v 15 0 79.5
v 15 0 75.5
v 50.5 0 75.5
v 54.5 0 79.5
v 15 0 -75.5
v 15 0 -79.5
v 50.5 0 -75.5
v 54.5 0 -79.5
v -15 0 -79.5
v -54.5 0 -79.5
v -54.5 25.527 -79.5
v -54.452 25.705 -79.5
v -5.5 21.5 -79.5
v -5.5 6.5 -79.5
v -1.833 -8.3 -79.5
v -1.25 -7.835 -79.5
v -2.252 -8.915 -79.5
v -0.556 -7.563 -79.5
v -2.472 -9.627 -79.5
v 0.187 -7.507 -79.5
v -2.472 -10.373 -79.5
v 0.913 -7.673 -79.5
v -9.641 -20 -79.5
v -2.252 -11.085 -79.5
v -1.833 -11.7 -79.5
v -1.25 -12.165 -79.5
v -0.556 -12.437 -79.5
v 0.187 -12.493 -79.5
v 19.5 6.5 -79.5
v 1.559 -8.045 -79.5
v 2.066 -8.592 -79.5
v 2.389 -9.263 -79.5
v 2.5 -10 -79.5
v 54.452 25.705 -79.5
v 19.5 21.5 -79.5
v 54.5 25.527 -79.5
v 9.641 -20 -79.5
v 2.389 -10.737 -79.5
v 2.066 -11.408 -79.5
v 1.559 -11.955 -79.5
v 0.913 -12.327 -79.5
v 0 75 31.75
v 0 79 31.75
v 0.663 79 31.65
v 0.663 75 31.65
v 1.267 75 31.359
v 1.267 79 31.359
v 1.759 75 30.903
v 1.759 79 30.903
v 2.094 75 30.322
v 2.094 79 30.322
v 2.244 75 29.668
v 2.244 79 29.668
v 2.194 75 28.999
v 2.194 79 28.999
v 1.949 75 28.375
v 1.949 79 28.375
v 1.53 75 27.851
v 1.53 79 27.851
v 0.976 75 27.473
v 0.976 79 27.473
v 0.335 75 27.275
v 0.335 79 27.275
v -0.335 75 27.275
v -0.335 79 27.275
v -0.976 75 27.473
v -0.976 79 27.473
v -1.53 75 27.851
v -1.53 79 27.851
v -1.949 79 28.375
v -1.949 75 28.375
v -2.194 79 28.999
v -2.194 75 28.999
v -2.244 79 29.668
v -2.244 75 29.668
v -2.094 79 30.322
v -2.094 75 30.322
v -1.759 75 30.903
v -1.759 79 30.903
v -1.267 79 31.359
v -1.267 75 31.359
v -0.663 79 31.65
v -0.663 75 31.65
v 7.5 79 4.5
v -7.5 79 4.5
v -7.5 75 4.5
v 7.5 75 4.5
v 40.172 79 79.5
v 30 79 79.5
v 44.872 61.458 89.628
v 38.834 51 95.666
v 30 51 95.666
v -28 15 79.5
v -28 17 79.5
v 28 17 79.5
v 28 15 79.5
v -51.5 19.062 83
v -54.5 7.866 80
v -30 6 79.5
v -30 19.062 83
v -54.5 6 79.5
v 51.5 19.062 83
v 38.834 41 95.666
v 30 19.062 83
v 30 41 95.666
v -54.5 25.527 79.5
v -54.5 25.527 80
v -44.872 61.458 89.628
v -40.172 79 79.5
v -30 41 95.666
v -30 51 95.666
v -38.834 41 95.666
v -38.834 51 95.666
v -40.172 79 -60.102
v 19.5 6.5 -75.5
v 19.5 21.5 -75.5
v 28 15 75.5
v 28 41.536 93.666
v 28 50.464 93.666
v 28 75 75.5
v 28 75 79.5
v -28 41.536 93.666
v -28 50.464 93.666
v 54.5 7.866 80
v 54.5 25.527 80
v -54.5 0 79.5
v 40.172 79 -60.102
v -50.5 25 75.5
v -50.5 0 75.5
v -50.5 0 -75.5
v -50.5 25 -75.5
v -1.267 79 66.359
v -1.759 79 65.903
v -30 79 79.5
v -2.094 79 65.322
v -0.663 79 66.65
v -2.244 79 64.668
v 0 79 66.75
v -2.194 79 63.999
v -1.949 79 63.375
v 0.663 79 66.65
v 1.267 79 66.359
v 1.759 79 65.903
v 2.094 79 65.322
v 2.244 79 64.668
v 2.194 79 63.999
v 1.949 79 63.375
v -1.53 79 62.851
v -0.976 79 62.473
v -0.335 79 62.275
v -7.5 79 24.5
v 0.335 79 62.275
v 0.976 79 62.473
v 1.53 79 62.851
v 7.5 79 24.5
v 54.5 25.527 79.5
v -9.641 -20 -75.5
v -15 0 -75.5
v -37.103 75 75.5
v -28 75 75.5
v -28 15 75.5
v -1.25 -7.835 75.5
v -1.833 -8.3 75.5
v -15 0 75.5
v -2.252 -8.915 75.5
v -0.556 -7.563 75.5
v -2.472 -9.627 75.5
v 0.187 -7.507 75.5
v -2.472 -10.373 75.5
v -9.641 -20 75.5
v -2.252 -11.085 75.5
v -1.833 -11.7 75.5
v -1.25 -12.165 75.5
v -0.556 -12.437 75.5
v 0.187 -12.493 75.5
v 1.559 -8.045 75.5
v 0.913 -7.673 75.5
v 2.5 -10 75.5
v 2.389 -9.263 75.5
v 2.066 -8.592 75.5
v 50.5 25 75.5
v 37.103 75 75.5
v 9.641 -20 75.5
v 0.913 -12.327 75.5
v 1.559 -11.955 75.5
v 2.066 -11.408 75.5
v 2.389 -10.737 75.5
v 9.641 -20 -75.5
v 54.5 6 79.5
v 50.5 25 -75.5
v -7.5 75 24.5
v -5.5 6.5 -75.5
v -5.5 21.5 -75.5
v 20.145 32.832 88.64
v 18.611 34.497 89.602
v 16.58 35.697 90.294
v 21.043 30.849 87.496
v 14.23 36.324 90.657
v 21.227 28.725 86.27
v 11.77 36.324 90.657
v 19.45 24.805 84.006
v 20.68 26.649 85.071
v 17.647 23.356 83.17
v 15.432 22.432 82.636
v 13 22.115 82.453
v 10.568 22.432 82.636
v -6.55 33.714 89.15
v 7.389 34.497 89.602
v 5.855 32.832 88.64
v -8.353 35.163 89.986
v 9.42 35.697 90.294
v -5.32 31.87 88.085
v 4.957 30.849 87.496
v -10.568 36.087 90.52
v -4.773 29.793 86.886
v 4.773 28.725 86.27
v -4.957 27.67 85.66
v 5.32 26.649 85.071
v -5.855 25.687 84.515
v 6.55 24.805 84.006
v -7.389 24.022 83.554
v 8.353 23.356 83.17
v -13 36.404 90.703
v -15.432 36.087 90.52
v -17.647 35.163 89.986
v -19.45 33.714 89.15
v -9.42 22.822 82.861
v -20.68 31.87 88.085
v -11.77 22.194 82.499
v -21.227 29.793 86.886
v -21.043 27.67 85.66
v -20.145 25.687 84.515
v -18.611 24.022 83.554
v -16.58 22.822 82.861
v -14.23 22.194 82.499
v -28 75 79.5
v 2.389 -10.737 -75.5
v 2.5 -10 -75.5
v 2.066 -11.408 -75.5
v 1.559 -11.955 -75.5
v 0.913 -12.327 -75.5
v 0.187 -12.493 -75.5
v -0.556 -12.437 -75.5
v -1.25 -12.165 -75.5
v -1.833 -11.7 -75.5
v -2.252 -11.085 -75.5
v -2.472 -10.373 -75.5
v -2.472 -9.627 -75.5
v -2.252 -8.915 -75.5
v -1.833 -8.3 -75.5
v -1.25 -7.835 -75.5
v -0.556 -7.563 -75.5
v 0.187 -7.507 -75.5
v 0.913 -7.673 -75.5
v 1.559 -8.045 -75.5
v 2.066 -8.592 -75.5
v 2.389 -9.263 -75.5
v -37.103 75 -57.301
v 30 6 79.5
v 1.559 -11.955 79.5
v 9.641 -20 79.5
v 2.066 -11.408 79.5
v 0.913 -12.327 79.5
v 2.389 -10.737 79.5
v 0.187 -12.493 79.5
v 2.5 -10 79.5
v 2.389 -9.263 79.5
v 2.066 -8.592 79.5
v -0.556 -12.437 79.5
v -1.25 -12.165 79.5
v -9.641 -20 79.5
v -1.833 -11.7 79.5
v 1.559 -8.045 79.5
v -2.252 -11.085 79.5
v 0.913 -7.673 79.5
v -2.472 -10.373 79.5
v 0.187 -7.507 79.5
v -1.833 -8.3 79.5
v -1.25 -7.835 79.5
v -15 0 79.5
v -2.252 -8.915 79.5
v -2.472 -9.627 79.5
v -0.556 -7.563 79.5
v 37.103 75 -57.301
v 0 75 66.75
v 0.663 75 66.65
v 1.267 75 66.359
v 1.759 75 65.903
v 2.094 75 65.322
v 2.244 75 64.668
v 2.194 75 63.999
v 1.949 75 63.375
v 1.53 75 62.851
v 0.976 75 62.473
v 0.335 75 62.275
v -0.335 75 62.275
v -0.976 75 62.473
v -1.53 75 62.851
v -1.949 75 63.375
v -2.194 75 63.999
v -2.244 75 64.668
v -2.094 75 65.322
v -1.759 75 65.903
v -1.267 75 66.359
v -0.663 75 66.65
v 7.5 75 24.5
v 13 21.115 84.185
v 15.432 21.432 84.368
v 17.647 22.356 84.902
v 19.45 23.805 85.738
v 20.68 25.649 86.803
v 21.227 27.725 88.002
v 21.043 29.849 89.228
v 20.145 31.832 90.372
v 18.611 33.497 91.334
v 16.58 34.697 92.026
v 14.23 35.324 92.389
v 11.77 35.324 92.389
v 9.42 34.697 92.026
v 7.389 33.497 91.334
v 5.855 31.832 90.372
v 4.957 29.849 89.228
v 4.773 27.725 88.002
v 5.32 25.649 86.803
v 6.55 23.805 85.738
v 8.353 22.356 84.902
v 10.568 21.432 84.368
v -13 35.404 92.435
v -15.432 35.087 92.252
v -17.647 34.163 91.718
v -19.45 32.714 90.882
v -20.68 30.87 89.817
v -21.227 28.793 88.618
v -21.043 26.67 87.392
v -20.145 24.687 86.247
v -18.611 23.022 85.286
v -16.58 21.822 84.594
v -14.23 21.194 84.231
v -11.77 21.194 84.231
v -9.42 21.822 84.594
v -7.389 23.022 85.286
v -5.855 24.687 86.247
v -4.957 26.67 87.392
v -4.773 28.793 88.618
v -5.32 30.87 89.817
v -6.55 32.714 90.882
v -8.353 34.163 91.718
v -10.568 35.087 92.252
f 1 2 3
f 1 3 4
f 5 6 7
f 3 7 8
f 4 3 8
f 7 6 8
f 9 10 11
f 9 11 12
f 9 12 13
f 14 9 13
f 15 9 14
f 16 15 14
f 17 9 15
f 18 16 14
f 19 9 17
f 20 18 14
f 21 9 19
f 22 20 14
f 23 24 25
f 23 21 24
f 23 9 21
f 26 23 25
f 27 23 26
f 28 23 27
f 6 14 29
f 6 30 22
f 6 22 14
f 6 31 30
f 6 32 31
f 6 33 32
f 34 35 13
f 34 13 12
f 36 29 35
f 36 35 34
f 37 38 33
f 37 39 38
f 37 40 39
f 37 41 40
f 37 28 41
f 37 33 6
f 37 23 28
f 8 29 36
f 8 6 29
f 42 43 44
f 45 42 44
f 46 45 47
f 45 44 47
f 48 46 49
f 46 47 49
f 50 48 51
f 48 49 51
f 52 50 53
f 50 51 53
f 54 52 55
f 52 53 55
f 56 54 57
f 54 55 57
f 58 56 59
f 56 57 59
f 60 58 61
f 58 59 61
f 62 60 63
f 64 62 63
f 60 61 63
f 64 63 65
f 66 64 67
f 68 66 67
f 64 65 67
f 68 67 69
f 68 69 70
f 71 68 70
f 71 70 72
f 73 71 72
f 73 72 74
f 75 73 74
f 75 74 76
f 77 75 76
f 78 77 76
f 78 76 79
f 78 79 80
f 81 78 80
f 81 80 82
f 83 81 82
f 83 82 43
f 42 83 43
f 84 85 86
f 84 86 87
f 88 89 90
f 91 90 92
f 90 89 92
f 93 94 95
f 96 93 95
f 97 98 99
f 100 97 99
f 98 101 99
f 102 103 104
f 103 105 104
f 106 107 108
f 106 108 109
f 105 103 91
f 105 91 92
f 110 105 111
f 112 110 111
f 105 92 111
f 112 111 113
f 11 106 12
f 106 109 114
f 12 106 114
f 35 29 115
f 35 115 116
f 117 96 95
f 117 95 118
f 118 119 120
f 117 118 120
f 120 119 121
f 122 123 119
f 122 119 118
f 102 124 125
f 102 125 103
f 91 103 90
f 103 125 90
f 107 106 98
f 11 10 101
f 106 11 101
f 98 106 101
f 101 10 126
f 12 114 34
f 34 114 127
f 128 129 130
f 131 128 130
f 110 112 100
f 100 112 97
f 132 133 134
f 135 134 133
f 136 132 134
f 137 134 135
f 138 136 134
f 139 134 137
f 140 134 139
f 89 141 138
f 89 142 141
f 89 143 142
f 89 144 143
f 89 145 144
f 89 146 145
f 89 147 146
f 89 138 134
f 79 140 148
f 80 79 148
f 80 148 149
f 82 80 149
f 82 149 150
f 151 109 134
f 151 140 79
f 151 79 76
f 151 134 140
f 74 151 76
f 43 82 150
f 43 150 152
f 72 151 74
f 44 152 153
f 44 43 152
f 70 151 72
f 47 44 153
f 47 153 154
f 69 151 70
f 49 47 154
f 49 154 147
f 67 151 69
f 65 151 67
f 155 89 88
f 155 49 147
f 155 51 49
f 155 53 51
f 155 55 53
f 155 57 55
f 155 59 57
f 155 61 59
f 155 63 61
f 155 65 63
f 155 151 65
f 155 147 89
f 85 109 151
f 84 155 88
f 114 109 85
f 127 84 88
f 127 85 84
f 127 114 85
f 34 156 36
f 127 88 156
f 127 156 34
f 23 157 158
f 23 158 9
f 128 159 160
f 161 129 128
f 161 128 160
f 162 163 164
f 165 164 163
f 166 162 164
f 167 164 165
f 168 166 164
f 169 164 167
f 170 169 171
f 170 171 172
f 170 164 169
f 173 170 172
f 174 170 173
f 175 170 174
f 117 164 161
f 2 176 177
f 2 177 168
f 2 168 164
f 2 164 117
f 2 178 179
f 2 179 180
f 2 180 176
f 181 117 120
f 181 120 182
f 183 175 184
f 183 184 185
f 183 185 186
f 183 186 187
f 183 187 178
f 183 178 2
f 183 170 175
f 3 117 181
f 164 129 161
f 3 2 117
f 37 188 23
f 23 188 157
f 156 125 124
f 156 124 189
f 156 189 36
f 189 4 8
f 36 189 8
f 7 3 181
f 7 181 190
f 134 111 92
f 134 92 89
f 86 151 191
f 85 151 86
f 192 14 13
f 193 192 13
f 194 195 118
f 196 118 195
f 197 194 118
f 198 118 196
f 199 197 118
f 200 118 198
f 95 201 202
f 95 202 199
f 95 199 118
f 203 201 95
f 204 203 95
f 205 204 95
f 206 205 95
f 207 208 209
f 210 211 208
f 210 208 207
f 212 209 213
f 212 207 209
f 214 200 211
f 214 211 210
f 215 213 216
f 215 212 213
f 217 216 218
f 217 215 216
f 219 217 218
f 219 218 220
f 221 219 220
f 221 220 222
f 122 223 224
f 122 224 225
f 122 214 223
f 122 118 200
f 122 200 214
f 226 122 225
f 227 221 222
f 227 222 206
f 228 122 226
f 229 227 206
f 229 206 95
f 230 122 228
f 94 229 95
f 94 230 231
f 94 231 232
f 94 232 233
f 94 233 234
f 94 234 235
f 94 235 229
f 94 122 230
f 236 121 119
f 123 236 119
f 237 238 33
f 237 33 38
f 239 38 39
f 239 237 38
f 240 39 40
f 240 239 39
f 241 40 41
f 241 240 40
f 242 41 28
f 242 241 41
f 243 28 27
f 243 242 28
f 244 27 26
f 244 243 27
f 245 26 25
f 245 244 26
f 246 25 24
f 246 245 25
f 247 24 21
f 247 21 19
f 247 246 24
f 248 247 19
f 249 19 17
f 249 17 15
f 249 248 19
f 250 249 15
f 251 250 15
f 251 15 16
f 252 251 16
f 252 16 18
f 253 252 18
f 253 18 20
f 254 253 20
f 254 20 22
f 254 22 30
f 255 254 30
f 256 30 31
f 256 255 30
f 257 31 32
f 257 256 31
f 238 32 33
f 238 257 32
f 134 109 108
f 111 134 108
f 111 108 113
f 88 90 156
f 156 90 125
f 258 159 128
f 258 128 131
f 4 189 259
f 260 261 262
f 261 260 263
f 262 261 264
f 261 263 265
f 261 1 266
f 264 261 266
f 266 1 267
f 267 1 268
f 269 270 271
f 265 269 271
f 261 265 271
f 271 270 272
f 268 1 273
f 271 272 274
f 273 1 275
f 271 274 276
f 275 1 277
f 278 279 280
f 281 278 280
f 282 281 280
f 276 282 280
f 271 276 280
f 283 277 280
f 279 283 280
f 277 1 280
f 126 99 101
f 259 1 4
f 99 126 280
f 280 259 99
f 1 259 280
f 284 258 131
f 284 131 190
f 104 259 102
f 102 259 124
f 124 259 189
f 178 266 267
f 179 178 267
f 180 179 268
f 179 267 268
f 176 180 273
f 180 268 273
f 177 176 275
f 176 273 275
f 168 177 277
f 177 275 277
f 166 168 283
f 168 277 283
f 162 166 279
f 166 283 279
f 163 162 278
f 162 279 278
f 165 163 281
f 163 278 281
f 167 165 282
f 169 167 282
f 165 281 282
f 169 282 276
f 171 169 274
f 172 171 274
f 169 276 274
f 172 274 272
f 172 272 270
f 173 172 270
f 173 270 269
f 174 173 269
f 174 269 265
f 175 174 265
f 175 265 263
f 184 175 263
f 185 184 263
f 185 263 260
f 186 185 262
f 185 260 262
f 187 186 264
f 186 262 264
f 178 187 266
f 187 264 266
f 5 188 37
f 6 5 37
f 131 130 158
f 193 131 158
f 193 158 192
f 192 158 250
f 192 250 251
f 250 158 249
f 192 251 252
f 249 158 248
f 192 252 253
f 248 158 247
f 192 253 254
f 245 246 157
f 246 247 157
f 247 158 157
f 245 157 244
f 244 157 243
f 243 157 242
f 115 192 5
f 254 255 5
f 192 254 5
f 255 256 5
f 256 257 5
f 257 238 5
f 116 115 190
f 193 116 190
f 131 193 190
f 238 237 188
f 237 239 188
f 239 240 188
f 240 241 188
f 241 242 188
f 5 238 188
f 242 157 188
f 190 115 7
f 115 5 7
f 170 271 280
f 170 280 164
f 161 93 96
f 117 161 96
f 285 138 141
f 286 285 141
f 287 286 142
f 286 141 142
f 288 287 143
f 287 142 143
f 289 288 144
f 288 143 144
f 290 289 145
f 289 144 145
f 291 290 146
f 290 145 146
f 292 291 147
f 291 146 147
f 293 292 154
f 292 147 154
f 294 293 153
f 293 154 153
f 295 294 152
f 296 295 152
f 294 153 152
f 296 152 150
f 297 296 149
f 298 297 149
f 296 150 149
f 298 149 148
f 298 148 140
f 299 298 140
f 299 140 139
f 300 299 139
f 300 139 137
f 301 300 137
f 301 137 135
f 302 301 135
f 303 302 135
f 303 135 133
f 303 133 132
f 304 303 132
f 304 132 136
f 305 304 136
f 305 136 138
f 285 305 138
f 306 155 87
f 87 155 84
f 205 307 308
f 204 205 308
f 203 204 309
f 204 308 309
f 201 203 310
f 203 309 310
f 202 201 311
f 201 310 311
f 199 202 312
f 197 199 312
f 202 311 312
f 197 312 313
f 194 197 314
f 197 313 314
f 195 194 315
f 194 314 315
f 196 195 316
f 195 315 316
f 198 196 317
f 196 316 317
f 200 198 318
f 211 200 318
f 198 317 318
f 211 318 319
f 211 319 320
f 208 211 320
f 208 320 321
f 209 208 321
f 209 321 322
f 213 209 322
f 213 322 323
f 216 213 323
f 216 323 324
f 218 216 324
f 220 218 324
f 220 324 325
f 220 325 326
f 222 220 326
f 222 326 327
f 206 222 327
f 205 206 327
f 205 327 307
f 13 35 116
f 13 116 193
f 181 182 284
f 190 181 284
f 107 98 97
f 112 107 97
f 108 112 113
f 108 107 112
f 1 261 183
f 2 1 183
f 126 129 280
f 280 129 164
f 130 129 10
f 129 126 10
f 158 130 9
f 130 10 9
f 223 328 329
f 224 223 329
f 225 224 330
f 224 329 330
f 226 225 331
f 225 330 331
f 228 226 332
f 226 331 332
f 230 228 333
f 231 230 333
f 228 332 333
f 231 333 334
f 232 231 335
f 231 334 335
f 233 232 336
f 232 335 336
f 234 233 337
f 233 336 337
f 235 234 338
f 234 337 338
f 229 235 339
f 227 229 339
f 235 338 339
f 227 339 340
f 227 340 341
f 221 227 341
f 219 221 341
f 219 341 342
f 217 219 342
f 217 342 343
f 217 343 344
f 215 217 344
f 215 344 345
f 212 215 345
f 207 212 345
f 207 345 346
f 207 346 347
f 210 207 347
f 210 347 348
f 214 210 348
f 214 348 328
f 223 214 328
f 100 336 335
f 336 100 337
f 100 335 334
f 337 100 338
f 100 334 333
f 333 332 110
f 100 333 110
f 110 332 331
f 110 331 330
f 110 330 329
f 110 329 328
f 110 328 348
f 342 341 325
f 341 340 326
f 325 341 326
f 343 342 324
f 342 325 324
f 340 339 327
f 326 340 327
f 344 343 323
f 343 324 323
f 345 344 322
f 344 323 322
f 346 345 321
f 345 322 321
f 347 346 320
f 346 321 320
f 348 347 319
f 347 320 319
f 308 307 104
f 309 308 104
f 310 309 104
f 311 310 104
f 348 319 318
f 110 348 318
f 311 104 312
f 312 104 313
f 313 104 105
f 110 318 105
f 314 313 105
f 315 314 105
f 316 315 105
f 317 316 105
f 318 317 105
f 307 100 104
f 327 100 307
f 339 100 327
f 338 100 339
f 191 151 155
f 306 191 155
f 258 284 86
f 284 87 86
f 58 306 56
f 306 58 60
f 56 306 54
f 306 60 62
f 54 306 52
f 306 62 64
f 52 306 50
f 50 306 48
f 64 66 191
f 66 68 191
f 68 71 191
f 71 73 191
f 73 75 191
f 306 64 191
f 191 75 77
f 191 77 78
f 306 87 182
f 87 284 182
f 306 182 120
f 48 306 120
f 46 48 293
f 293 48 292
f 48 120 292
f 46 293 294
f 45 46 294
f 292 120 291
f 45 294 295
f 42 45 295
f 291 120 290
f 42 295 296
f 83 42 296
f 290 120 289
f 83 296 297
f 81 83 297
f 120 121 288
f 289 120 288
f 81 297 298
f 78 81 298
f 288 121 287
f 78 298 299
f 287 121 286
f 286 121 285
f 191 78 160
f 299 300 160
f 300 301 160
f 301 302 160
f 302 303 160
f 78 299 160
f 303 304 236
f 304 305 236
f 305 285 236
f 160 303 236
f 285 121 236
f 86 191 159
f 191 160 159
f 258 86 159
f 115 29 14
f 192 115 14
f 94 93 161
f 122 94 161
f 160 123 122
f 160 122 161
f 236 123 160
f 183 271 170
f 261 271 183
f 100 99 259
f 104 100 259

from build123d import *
from OCP.BRepFilletAPI import BRepFilletAPI_MakeChamfer

# Parameters (mm, degrees)
SKETCH1_W                                    = 101
SKETCH1_H                                    = 151
BOX_DEPTH                                    = 75
CHAMFER_SIDES_SIZE                           = 50
CHAMFER_SIDES_SIZE2                          = 13.397459622
CHAMFER_BACK_SIZE                            = 50
CHAMFER_BACK_SIZE2                           = 18.198511713
SHELL1_T                                     = 4
SKETCH2_W                                    = 30
SKETCH2_H                                    = 20
SKETCH2_R                                    = 2.5
FRONT_MOUNT_TAB_DEPTH                        = 4
BACK_START                                   = -4
SKETCH3_W                                    = 30
SKETCH3_H                                    = 20
SKETCH3_R                                    = 2.5
BACK_MOUNT_TAB_DEPTH                         = 4
CHAMFER_MOUNT_TAB_SIZE                       = 20
CHAMFER_MOUNT_TAB_SIZE_2                     = 5.358983849
HEAD_ASSEMBLY_MOUNT_AND_CABLE_PASSTHRU_REACH = 140.172
SKETCH4_R                                    = 2.25
SKETCH4_W                                    = 15
SKETCH4_H                                    = 20
STAIR_DETECTION_MOUNT_DEPTH                  = 30
SHELL_START                                  = -28
SHELL_MOUNT_DEPTH                            = 56
SKETCH7_W                                    = 56
SKETCH7_H                                    = 62
OPEN_SHELL_TO_SHELL_DEPTH                    = 4
FILL_GAP_REACH                               = 187.721
SKETCH9_W                                    = 56
SKETCH9_H                                    = 2
STAIR_DETECTION_EYE_HOLES_REACH              = 183.466
SKETCH8_R                                    = 8.25
CHAMFER_FRONT_1_SIZE                         = 25
CHAMFER_FRONT_2_SIZE                         = 7
POWER_SWITCH_AND_USB_ACCESS_REACH            = 201.736
SKETCH10_W                                   = 25
SKETCH10_H                                   = 15


# Read off the part's stored shape, not the designer's step: shell mount
# Some blends are built 0.0001 mm under size
with BuildPart() as part:
    # Sketch1 → box (new body)
    with BuildSketch(Plane(origin=(0, 0, 0), x_dir=(1, 0, 0), z_dir=(0, 1, 0))):
        Rectangle(SKETCH1_W, SKETCH1_H)
    extrude(amount=BOX_DEPTH)

    # Chamfer sides: one chamfer whose edges measure the first distance from different faces: ONE call of the kernel's chamfer builder (chamfer() names one face for all edges)
    chamfer_sides_edges_1 = [part.edges().sort_by_distance(p)[0] for p in [
        (-50.5, 75, 0),
    ]]
    chamfer_sides_side_1 = [part.faces().sort_by_distance(p)[0] for p in [
        (-50.5, 37.5, 0),
    ]]
    chamfer_sides_edges_2 = [part.edges().sort_by_distance(p)[0] for p in [
        (50.5, 75, 0),
    ]]
    chamfer_sides_side_2 = [part.faces().sort_by_distance(p)[0] for p in [
        (50.5, 37.5, 0),
    ]]
    chamfer_sides = BRepFilletAPI_MakeChamfer(part.part.solid().wrapped)
    for e in chamfer_sides_edges_1:
        chamfer_sides.Add(CHAMFER_SIDES_SIZE, CHAMFER_SIDES_SIZE2, e.wrapped, chamfer_sides_side_1[0].wrapped)  # the first distance lies on this face
    for e in chamfer_sides_edges_2:
        chamfer_sides.Add(CHAMFER_SIDES_SIZE, CHAMFER_SIDES_SIZE2, e.wrapped, chamfer_sides_side_2[0].wrapped)  # the first distance lies on this face
    add(Compound.cast(chamfer_sides.Shape()), mode=Mode.REPLACE)

    # Chamfer back
    chamfer_back_edges = [part.edges().sort_by_distance(p)[0] for p in [
        (0, 75, -75.5),
    ]]
    chamfer_back_side = [part.faces().sort_by_distance(p)[0] for p in [
        (0, 35.478938394, -75.5),
    ]]
    chamfer(chamfer_back_edges, length=CHAMFER_BACK_SIZE, length2=CHAMFER_BACK_SIZE2, reference=chamfer_back_side[0])

    # Shell1
    shell1_openings = [part.faces().sort_by_distance(p)[0] for p in [
        (0, 0, 0),
    ]]
    offset(amount=SHELL1_T, openings=shell1_openings, kind=Kind.INTERSECTION)

    # Sketch2 → front mount tab (add)
    with BuildSketch(Plane.XY.offset(79.5)):
        with Locations((0, -10)):
            Rectangle(SKETCH2_W, SKETCH2_H)
        with Locations((0, -10)):
            Circle(SKETCH2_R, mode=Mode.SUBTRACT)
    extrude(amount=-FRONT_MOUNT_TAB_DEPTH)

    # Sketch3 → back mount tab (add)
    with BuildSketch(Plane(origin=(0, 0, -79.5), x_dir=(-1, 0, 0), z_dir=(0, 0, -1)).offset(BACK_START)):
        with Locations((0, -10)):
            Rectangle(SKETCH3_W, SKETCH3_H)
        with Locations(Location((0, -10, 0), (0, 0, 180))):
            Circle(SKETCH3_R, mode=Mode.SUBTRACT)
    extrude(amount=BACK_MOUNT_TAB_DEPTH)

    # Chamfer mount tab
    chamfer_mount_tab_edges_1 = [part.edges().sort_by_distance(p)[0] for p in [
        (-15, -20, 77.5),
    ]]
    chamfer_mount_tab_side_1 = [part.faces().sort_by_distance(p)[0] for p in [
        (-15, -19.892820323, 77.5),
    ]]
    chamfer_mount_tab_edges_2 = [part.edges().sort_by_distance(p)[0] for p in [
        (15, -20, 77.5),
    ]]
    chamfer_mount_tab_side_2 = [part.faces().sort_by_distance(p)[0] for p in [
        (15, -19.892820323, 77.5),
    ]]
    chamfer_mount_tab_edges_3 = [part.edges().sort_by_distance(p)[0] for p in [
        (-15, -20, -77.5),
    ]]
    chamfer_mount_tab_side_3 = [part.faces().sort_by_distance(p)[0] for p in [
        (-15, -19.892820323, -77.5),
    ]]
    chamfer_mount_tab_edges_4 = [part.edges().sort_by_distance(p)[0] for p in [
        (15, -20, -77.5),
    ]]
    chamfer_mount_tab_side_4 = [part.faces().sort_by_distance(p)[0] for p in [
        (14.892820323, -20, -77.5),
    ]]
    chamfer_mount_tab = BRepFilletAPI_MakeChamfer(part.part.solid().wrapped)
    for e in chamfer_mount_tab_edges_1:
        chamfer_mount_tab.Add(CHAMFER_MOUNT_TAB_SIZE - 0.0001, CHAMFER_MOUNT_TAB_SIZE_2 - 0.0001, e.wrapped, chamfer_mount_tab_side_1[0].wrapped)
    for e in chamfer_mount_tab_edges_2:
        chamfer_mount_tab.Add(CHAMFER_MOUNT_TAB_SIZE - 0.0001, CHAMFER_MOUNT_TAB_SIZE_2 - 0.0001, e.wrapped, chamfer_mount_tab_side_2[0].wrapped)
    for e in chamfer_mount_tab_edges_3:
        chamfer_mount_tab.Add(CHAMFER_MOUNT_TAB_SIZE - 0.0001, CHAMFER_MOUNT_TAB_SIZE_2 - 0.0001, e.wrapped, chamfer_mount_tab_side_3[0].wrapped)
    for e in chamfer_mount_tab_edges_4:
        chamfer_mount_tab.Add(CHAMFER_MOUNT_TAB_SIZE_2 - 0.0001, CHAMFER_MOUNT_TAB_SIZE - 0.0001, e.wrapped, chamfer_mount_tab_side_4[0].wrapped)
    add(Compound.cast(chamfer_mount_tab.Shape()), mode=Mode.REPLACE)  # a hair under: the kernel refuses the full size

    # Sketch4 → head assembly mount and cable passthru (cut, up to next)
    with BuildSketch(Plane(origin=(0, 79, 0), x_dir=(1, 0, 0), z_dir=(0, 1, 0)), mode=Mode.PRIVATE) as head_assembly_mount_and_cable_passthru_sk1:
        with Locations(Location((0, -64.5, 0), (0, 0, 270))):
            Circle(SKETCH4_R)
    head_assembly_mount_and_cable_passthru_tool1 = extrude(head_assembly_mount_and_cable_passthru_sk1.sketch, amount=-HEAD_ASSEMBLY_MOUNT_AND_CABLE_PASSTHRU_REACH, mode=Mode.PRIVATE) & part.part
    # Sketch4 → head assembly mount and cable passthru (cut, up to next)
    with BuildSketch(Plane(origin=(0, 79, 0), x_dir=(1, 0, 0), z_dir=(0, 1, 0)), mode=Mode.PRIVATE) as head_assembly_mount_and_cable_passthru_sk2:
        with Locations(Location((0, -29.5, 0), (0, 0, 270))):
            Circle(SKETCH4_R)
    head_assembly_mount_and_cable_passthru_tool2 = extrude(head_assembly_mount_and_cable_passthru_sk2.sketch, amount=-HEAD_ASSEMBLY_MOUNT_AND_CABLE_PASSTHRU_REACH, mode=Mode.PRIVATE) & part.part
    # Sketch4 → head assembly mount and cable passthru (cut, up to next)
    with BuildSketch(Plane(origin=(0, 79, 0), x_dir=(1, 0, 0), z_dir=(0, 1, 0)), mode=Mode.PRIVATE) as head_assembly_mount_and_cable_passthru_sk3:
        with Locations((0, -14.5)):
            Rectangle(SKETCH4_W, SKETCH4_H)
    head_assembly_mount_and_cable_passthru_tool3 = extrude(head_assembly_mount_and_cable_passthru_sk3.sketch, amount=-HEAD_ASSEMBLY_MOUNT_AND_CABLE_PASSTHRU_REACH, mode=Mode.PRIVATE) & part.part
    add(head_assembly_mount_and_cable_passthru_tool1.solids().sort_by_distance((0, 79, 64.5))[0], mode=Mode.SUBTRACT)
    add(head_assembly_mount_and_cable_passthru_tool2.solids().sort_by_distance((0, 79, 29.5))[0], mode=Mode.SUBTRACT)
    add(head_assembly_mount_and_cable_passthru_tool3.solids().sort_by_distance((0, 79, 14.5))[0], mode=Mode.SUBTRACT)


with BuildPart() as body_2:
    # Sketch5 → stair detection mount (new, symmetric)
    with BuildSketch(Plane(origin=(0, 0, 0), x_dir=(0, 0, -1), z_dir=(1, 0, 0))):
        Polygon((-79.5, 13), (-95.665807537, 41), (-95.665807537, 51), (-79.5, 79), (-75.5, 79), (-75.5, 75), (-75.5, 25), (-75.5, 13), align=None)
    extrude(amount=STAIR_DETECTION_MOUNT_DEPTH, both=True)

    # shell mount outline → shell mount (cut)
    with BuildSketch(Plane.YZ.offset(SHELL_START)):
        Polygon((77, 75.5), (77, 78.345299462), (50.464101615, 93.665807537), (41.535898385, 93.665807537), (15, 78.345299462), (15, 75.5), align=None)
    extrude(amount=SHELL_MOUNT_DEPTH, mode=Mode.SUBTRACT)


with BuildPart() as open_shell_to_shell_tool:
    # Sketch7 → open shell to shell (new body)
    with BuildSketch(Plane.XY.offset(79.5)):
        with Locations((0, 46)):
            Rectangle(SKETCH7_W, SKETCH7_H)
    extrude(amount=-OPEN_SHELL_TO_SHELL_DEPTH)


with BuildPart() as part_1:
    add(part.part)

    # open shell to shell: cut by open_shell_to_shell_tool
    add(open_shell_to_shell_tool.part, mode=Mode.SUBTRACT)

    # Sketch9 → fill gap (add, up to next)
    with BuildSketch(Plane(origin=(0, 0, 79.5), x_dir=(-1, 0, 0), z_dir=(0, 0, -1)), mode=Mode.PRIVATE) as fill_gap_sk1:
        with Locations((0, 76)):
            Rectangle(SKETCH9_W, SKETCH9_H)
    fill_gap_tool1 = extrude(fill_gap_sk1.sketch, amount=FILL_GAP_REACH, mode=Mode.PRIVATE) - part_1.part
    add(fill_gap_tool1.solids().sort_by_distance((0, 76, 79.5))[0])


with BuildPart() as body_2_1:
    add(body_2.part)

    # open shell to shell: cut by open_shell_to_shell_tool
    add(open_shell_to_shell_tool.part, mode=Mode.SUBTRACT)


with BuildPart() as part_2:
    add(part_1.part)

    # Combine two shells: union body 2
    add(body_2_1.part)

    # Sketch8 → stair detection eye holes (cut, up to next)
    with BuildSketch(Plane(origin=(0, -31.1745098, 53.995834875), x_dir=(1, 0, 0), z_dir=(0, -0.4999999999999956, 0.8660254037844412)), mode=Mode.PRIVATE) as stair_detection_eye_holes_sk1:
        with Locations(Location((13, 68.628330249, 0), (0, 0, 270))):
            Circle(SKETCH8_R)
    stair_detection_eye_holes_tool1 = extrude(stair_detection_eye_holes_sk1.sketch, amount=-STAIR_DETECTION_EYE_HOLES_REACH, mode=Mode.PRIVATE) & part_2.part
    # Sketch8 → stair detection eye holes (cut, up to next)
    with BuildSketch(Plane(origin=(0, -31.1745098, 53.995834875), x_dir=(1, 0, 0), z_dir=(0, -0.4999999999999956, 0.8660254037844412)), mode=Mode.PRIVATE) as stair_detection_eye_holes_sk2:
        with Locations(Location((-13, 68.628330249, 0), (0, 0, 90))):
            Circle(SKETCH8_R)
    stair_detection_eye_holes_tool2 = extrude(stair_detection_eye_holes_sk2.sketch, amount=-STAIR_DETECTION_EYE_HOLES_REACH, mode=Mode.PRIVATE) & part_2.part
    add(stair_detection_eye_holes_tool1.solids().sort_by_distance((13, 28.259368, 88.31))[0], mode=Mode.SUBTRACT)
    add(stair_detection_eye_holes_tool2.solids().sort_by_distance((-13, 28.259368, 88.31))[0], mode=Mode.SUBTRACT)

    # Chamfer front 1
    # the kernel refuses this chamfer: 25 mm, written as the material it adds along each edge
    with BuildSketch(Plane(origin=(-30, 79, 79.5), x_dir=(-0.9996219169112966, 0, -0.027495876610586594), z_dir=(0, -1, 0))) as chamfer_front_1_piece_1_section:
        Polygon((CHAMFER_FRONT_1_SIZE * 0.999621916911, -CHAMFER_FRONT_1_SIZE * 0.0274958766106), (-CHAMFER_FRONT_1_SIZE * 0.0274958766106, -CHAMFER_FRONT_1_SIZE * 0.999621916911), (0, 0), align=None)
    chamfer_front_1_piece_1 = extrude(amount=130.292074699, mode=Mode.PRIVATE)
    chamfer_front_1_piece_1 = split(chamfer_front_1_piece_1, bisect_by=Plane(origin=(-54.5, 43.759151697, 84.684492494), z_dir=(1, 0, 0)), keep=Keep.TOP, mode=Mode.PRIVATE)
    chamfer_front_1_piece_1 = split(chamfer_front_1_piece_1, bisect_by=Plane(origin=(-48.880491022, 46.498903009, 84.684492494), z_dir=(0.9659258262890682, -0.25881904510252135, 0)), keep=Keep.TOP, mode=Mode.PRIVATE)
    chamfer_front_1_piece_1 = split(chamfer_front_1_piece_1, bisect_by=Plane(origin=(-38.655599925, 38.314314876, 94.115226508), z_dir=(0, 0.4999999999999953, -0.8660254037844416)), keep=Keep.TOP, mode=Mode.PRIVATE)
    chamfer_front_1_piece_1 = split(chamfer_front_1_piece_1, bisect_by=Plane(origin=(-38.655599925, 50.32441267, 96.055858064), z_dir=(0, -0.4999999999999949, -0.8660254037844416)), keep=Keep.TOP, mode=Mode.PRIVATE)
    chamfer_front_1_piece_1 = split(chamfer_front_1_piece_1, bisect_by=Plane(origin=(-38.655599925, 43.759151697, 95.665807537), z_dir=(0, 0, -1)), keep=Keep.TOP, mode=Mode.PRIVATE)
    add(chamfer_front_1_piece_1)
    with BuildSketch(Plane(origin=(30, 79, 79.5), x_dir=(0.9996219169112966, 0, -0.027495876610586594), z_dir=(0, -1, 0))) as chamfer_front_1_piece_2_section:
        Polygon((CHAMFER_FRONT_1_SIZE * 0.999621916911, CHAMFER_FRONT_1_SIZE * 0.0274958766106), (-CHAMFER_FRONT_1_SIZE * 0.0274958766106, CHAMFER_FRONT_1_SIZE * 0.999621916911), (0, 0), align=None)
    chamfer_front_1_piece_2 = extrude(amount=130.292074699, mode=Mode.PRIVATE)
    chamfer_front_1_piece_2 = split(chamfer_front_1_piece_2, bisect_by=Plane(origin=(38.655599925, 38.314314876, 94.115226508), z_dir=(0, 0.4999999999999953, -0.8660254037844416)), keep=Keep.TOP, mode=Mode.PRIVATE)
    chamfer_front_1_piece_2 = split(chamfer_front_1_piece_2, bisect_by=Plane(origin=(48.880491022, 46.498903009, 84.684492494), z_dir=(-0.9659258262890682, -0.25881904510252135, 0)), keep=Keep.TOP, mode=Mode.PRIVATE)
    chamfer_front_1_piece_2 = split(chamfer_front_1_piece_2, bisect_by=Plane(origin=(54.5, 43.759151697, 84.684492494), z_dir=(-1, 0, 0)), keep=Keep.TOP, mode=Mode.PRIVATE)
    chamfer_front_1_piece_2 = split(chamfer_front_1_piece_2, bisect_by=Plane(origin=(38.655599925, 50.32441267, 96.055858064), z_dir=(0, -0.4999999999999949, -0.8660254037844416)), keep=Keep.TOP, mode=Mode.PRIVATE)
    chamfer_front_1_piece_2 = split(chamfer_front_1_piece_2, bisect_by=Plane(origin=(38.655599925, 43.759151697, 95.665807537), z_dir=(0, 0, -1)), keep=Keep.TOP, mode=Mode.PRIVATE)
    add(chamfer_front_1_piece_2)

    # Chamfer front 2
    chamfer_front_2_edges = [part_2.edges().sort_by_distance(p)[0] for p in [
        (0, 13, 79.5),
    ]]
    chamfer(chamfer_front_2_edges, length=CHAMFER_FRONT_2_SIZE)

    # Sketch10 → power switch and USB access (cut, up to next)
    with BuildSketch(Plane(origin=(0, 0, -79.5), x_dir=(-1, 0, 0), z_dir=(0, 0, -1)), mode=Mode.PRIVATE) as power_switch_and_usb_access_sk1:
        with Locations((-7, 14)):
            Rectangle(SKETCH10_W, SKETCH10_H)
    power_switch_and_usb_access_tool1 = extrude(power_switch_and_usb_access_sk1.sketch, amount=-POWER_SWITCH_AND_USB_ACCESS_REACH, mode=Mode.PRIVATE) & part_2.part
    add(power_switch_and_usb_access_tool1.solids().sort_by_distance((7, 14, -79.5))[0], mode=Mode.SUBTRACT)


solid = part_2.part
